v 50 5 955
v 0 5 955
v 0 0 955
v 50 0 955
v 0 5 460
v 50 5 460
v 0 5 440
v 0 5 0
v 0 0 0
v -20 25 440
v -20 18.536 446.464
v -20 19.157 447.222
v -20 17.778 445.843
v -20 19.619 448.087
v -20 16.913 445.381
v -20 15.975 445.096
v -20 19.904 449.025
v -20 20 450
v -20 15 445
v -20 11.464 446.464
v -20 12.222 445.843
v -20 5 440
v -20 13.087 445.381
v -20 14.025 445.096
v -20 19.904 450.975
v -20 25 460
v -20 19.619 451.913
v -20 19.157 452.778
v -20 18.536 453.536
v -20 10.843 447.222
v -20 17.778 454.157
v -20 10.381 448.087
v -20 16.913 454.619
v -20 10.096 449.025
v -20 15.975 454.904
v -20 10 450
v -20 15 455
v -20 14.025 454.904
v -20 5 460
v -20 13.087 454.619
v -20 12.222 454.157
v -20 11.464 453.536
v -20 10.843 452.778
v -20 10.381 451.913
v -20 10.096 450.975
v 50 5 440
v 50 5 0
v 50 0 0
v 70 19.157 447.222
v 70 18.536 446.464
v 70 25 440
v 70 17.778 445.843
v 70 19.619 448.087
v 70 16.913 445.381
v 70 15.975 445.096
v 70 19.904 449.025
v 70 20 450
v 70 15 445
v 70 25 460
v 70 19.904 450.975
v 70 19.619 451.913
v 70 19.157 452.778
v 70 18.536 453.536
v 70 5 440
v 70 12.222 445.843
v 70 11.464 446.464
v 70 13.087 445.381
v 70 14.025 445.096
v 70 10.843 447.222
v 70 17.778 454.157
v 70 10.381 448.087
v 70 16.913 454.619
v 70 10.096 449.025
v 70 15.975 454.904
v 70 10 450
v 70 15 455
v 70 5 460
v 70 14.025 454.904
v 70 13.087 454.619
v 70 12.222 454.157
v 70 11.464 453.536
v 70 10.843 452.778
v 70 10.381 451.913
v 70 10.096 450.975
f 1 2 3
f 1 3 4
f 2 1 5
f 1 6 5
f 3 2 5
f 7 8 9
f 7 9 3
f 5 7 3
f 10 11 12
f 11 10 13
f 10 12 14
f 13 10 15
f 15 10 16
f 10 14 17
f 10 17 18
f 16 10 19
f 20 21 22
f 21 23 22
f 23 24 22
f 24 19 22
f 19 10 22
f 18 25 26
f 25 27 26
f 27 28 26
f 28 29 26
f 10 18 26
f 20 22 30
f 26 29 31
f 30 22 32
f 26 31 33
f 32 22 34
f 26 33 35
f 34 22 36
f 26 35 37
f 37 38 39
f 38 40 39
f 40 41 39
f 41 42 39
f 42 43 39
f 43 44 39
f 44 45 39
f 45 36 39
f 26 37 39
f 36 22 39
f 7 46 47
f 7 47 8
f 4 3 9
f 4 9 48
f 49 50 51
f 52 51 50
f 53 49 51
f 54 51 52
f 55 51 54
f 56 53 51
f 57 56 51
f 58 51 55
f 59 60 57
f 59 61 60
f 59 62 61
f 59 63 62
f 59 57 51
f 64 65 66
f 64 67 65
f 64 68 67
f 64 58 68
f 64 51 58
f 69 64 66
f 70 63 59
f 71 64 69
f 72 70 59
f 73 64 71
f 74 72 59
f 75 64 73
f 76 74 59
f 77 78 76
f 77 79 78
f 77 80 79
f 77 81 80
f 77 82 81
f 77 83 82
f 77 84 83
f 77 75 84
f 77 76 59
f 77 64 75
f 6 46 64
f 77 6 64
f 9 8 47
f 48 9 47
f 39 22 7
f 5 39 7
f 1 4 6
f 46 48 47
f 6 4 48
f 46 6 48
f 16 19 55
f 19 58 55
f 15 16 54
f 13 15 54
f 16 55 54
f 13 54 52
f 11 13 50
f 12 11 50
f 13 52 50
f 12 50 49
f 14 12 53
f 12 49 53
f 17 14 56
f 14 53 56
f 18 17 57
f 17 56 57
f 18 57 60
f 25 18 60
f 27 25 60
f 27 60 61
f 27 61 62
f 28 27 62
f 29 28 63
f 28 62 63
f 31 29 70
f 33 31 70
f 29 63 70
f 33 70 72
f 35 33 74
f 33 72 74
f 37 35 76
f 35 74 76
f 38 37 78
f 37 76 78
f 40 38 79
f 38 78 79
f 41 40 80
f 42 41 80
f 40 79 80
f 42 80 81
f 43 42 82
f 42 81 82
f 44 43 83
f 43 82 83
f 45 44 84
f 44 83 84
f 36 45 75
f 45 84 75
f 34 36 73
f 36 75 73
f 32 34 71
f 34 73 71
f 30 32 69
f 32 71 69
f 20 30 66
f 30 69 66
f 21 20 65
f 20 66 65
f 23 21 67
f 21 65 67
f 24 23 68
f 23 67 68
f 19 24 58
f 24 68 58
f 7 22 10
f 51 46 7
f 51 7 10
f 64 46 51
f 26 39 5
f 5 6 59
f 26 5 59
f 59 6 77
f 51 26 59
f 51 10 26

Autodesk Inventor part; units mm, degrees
ref_plane "YZ Plane" through (0, 0, 0) normal (1, 0, 0) x (0, 1, 0)
ref_plane "XZ Plane" through (0, 0, 0) normal (0, 1, 0) x (-1, 0, 0)
sketch "Sketch1" plane through (0, 0, 0) normal (0, 0, 1) x (1, 0, 0)
  line L0 (0, 0) -> (50, 0)
  line L1 (50, 0) -> (50, 5)
  line L2 (50, 5) -> (0, 5)
  line L3 (0, 5) -> (0, 0)
  dimension "d0" = 50
  dimension "d1" = 5
extrude "Extrusion1" add sketch "Sketch1" along normal blind 955
ref_plane "Work Plane1" through (0, 0, 0) normal (0, 0, 1) x (1, 0, 0)
sketch "Sketch3" plane through (0, 0, 0) normal (0, 0, 1) x (1, 0, 0)
  line L0 (0, 0) -> (50, 0) projected
  line L1 (0, 5) -> (0, 0) projected
  line L2 (50, 5) -> (0, 5) projected
  line L3 (50, 0) -> (50, 5) projected
  line L4 (0, 5) -> (50, 5) projected
  line L5 (0, 5) -> (0, 25) projected
  line L6 (50, 25) -> (0, 25) projected
  line L7 (50, 5) -> (50, 25) projected
sketch "Sketch5" plane through (0, 5, 0) normal (0, 1, 0) x (1, 0, 0)
  line L0 (70, -440) -> (70, -460)
  line L1 (-20, -440) -> (-20, -460)
  line L2 (50, 0) -> (0, 0) projected
  line L3 (-20, -460) -> (70, -460)
  line L4 (-20, -440) -> (70, -440)
  point P0 (50, -450)
  dimension "d33" = 20
extrude "Extrusion7" add sketch "Sketch5" along normal blind 20
sketch "Sketch7" plane through (70, 5, 460) normal (1, 0, 0) x (0, 0, -1)
  circle A0 centre (10, 10) radius 5
  point P0 (460, -5)
  dimension "d39" = 10
extrude "Extrusion8" cut sketch "Sketch7" against normal blind 100
